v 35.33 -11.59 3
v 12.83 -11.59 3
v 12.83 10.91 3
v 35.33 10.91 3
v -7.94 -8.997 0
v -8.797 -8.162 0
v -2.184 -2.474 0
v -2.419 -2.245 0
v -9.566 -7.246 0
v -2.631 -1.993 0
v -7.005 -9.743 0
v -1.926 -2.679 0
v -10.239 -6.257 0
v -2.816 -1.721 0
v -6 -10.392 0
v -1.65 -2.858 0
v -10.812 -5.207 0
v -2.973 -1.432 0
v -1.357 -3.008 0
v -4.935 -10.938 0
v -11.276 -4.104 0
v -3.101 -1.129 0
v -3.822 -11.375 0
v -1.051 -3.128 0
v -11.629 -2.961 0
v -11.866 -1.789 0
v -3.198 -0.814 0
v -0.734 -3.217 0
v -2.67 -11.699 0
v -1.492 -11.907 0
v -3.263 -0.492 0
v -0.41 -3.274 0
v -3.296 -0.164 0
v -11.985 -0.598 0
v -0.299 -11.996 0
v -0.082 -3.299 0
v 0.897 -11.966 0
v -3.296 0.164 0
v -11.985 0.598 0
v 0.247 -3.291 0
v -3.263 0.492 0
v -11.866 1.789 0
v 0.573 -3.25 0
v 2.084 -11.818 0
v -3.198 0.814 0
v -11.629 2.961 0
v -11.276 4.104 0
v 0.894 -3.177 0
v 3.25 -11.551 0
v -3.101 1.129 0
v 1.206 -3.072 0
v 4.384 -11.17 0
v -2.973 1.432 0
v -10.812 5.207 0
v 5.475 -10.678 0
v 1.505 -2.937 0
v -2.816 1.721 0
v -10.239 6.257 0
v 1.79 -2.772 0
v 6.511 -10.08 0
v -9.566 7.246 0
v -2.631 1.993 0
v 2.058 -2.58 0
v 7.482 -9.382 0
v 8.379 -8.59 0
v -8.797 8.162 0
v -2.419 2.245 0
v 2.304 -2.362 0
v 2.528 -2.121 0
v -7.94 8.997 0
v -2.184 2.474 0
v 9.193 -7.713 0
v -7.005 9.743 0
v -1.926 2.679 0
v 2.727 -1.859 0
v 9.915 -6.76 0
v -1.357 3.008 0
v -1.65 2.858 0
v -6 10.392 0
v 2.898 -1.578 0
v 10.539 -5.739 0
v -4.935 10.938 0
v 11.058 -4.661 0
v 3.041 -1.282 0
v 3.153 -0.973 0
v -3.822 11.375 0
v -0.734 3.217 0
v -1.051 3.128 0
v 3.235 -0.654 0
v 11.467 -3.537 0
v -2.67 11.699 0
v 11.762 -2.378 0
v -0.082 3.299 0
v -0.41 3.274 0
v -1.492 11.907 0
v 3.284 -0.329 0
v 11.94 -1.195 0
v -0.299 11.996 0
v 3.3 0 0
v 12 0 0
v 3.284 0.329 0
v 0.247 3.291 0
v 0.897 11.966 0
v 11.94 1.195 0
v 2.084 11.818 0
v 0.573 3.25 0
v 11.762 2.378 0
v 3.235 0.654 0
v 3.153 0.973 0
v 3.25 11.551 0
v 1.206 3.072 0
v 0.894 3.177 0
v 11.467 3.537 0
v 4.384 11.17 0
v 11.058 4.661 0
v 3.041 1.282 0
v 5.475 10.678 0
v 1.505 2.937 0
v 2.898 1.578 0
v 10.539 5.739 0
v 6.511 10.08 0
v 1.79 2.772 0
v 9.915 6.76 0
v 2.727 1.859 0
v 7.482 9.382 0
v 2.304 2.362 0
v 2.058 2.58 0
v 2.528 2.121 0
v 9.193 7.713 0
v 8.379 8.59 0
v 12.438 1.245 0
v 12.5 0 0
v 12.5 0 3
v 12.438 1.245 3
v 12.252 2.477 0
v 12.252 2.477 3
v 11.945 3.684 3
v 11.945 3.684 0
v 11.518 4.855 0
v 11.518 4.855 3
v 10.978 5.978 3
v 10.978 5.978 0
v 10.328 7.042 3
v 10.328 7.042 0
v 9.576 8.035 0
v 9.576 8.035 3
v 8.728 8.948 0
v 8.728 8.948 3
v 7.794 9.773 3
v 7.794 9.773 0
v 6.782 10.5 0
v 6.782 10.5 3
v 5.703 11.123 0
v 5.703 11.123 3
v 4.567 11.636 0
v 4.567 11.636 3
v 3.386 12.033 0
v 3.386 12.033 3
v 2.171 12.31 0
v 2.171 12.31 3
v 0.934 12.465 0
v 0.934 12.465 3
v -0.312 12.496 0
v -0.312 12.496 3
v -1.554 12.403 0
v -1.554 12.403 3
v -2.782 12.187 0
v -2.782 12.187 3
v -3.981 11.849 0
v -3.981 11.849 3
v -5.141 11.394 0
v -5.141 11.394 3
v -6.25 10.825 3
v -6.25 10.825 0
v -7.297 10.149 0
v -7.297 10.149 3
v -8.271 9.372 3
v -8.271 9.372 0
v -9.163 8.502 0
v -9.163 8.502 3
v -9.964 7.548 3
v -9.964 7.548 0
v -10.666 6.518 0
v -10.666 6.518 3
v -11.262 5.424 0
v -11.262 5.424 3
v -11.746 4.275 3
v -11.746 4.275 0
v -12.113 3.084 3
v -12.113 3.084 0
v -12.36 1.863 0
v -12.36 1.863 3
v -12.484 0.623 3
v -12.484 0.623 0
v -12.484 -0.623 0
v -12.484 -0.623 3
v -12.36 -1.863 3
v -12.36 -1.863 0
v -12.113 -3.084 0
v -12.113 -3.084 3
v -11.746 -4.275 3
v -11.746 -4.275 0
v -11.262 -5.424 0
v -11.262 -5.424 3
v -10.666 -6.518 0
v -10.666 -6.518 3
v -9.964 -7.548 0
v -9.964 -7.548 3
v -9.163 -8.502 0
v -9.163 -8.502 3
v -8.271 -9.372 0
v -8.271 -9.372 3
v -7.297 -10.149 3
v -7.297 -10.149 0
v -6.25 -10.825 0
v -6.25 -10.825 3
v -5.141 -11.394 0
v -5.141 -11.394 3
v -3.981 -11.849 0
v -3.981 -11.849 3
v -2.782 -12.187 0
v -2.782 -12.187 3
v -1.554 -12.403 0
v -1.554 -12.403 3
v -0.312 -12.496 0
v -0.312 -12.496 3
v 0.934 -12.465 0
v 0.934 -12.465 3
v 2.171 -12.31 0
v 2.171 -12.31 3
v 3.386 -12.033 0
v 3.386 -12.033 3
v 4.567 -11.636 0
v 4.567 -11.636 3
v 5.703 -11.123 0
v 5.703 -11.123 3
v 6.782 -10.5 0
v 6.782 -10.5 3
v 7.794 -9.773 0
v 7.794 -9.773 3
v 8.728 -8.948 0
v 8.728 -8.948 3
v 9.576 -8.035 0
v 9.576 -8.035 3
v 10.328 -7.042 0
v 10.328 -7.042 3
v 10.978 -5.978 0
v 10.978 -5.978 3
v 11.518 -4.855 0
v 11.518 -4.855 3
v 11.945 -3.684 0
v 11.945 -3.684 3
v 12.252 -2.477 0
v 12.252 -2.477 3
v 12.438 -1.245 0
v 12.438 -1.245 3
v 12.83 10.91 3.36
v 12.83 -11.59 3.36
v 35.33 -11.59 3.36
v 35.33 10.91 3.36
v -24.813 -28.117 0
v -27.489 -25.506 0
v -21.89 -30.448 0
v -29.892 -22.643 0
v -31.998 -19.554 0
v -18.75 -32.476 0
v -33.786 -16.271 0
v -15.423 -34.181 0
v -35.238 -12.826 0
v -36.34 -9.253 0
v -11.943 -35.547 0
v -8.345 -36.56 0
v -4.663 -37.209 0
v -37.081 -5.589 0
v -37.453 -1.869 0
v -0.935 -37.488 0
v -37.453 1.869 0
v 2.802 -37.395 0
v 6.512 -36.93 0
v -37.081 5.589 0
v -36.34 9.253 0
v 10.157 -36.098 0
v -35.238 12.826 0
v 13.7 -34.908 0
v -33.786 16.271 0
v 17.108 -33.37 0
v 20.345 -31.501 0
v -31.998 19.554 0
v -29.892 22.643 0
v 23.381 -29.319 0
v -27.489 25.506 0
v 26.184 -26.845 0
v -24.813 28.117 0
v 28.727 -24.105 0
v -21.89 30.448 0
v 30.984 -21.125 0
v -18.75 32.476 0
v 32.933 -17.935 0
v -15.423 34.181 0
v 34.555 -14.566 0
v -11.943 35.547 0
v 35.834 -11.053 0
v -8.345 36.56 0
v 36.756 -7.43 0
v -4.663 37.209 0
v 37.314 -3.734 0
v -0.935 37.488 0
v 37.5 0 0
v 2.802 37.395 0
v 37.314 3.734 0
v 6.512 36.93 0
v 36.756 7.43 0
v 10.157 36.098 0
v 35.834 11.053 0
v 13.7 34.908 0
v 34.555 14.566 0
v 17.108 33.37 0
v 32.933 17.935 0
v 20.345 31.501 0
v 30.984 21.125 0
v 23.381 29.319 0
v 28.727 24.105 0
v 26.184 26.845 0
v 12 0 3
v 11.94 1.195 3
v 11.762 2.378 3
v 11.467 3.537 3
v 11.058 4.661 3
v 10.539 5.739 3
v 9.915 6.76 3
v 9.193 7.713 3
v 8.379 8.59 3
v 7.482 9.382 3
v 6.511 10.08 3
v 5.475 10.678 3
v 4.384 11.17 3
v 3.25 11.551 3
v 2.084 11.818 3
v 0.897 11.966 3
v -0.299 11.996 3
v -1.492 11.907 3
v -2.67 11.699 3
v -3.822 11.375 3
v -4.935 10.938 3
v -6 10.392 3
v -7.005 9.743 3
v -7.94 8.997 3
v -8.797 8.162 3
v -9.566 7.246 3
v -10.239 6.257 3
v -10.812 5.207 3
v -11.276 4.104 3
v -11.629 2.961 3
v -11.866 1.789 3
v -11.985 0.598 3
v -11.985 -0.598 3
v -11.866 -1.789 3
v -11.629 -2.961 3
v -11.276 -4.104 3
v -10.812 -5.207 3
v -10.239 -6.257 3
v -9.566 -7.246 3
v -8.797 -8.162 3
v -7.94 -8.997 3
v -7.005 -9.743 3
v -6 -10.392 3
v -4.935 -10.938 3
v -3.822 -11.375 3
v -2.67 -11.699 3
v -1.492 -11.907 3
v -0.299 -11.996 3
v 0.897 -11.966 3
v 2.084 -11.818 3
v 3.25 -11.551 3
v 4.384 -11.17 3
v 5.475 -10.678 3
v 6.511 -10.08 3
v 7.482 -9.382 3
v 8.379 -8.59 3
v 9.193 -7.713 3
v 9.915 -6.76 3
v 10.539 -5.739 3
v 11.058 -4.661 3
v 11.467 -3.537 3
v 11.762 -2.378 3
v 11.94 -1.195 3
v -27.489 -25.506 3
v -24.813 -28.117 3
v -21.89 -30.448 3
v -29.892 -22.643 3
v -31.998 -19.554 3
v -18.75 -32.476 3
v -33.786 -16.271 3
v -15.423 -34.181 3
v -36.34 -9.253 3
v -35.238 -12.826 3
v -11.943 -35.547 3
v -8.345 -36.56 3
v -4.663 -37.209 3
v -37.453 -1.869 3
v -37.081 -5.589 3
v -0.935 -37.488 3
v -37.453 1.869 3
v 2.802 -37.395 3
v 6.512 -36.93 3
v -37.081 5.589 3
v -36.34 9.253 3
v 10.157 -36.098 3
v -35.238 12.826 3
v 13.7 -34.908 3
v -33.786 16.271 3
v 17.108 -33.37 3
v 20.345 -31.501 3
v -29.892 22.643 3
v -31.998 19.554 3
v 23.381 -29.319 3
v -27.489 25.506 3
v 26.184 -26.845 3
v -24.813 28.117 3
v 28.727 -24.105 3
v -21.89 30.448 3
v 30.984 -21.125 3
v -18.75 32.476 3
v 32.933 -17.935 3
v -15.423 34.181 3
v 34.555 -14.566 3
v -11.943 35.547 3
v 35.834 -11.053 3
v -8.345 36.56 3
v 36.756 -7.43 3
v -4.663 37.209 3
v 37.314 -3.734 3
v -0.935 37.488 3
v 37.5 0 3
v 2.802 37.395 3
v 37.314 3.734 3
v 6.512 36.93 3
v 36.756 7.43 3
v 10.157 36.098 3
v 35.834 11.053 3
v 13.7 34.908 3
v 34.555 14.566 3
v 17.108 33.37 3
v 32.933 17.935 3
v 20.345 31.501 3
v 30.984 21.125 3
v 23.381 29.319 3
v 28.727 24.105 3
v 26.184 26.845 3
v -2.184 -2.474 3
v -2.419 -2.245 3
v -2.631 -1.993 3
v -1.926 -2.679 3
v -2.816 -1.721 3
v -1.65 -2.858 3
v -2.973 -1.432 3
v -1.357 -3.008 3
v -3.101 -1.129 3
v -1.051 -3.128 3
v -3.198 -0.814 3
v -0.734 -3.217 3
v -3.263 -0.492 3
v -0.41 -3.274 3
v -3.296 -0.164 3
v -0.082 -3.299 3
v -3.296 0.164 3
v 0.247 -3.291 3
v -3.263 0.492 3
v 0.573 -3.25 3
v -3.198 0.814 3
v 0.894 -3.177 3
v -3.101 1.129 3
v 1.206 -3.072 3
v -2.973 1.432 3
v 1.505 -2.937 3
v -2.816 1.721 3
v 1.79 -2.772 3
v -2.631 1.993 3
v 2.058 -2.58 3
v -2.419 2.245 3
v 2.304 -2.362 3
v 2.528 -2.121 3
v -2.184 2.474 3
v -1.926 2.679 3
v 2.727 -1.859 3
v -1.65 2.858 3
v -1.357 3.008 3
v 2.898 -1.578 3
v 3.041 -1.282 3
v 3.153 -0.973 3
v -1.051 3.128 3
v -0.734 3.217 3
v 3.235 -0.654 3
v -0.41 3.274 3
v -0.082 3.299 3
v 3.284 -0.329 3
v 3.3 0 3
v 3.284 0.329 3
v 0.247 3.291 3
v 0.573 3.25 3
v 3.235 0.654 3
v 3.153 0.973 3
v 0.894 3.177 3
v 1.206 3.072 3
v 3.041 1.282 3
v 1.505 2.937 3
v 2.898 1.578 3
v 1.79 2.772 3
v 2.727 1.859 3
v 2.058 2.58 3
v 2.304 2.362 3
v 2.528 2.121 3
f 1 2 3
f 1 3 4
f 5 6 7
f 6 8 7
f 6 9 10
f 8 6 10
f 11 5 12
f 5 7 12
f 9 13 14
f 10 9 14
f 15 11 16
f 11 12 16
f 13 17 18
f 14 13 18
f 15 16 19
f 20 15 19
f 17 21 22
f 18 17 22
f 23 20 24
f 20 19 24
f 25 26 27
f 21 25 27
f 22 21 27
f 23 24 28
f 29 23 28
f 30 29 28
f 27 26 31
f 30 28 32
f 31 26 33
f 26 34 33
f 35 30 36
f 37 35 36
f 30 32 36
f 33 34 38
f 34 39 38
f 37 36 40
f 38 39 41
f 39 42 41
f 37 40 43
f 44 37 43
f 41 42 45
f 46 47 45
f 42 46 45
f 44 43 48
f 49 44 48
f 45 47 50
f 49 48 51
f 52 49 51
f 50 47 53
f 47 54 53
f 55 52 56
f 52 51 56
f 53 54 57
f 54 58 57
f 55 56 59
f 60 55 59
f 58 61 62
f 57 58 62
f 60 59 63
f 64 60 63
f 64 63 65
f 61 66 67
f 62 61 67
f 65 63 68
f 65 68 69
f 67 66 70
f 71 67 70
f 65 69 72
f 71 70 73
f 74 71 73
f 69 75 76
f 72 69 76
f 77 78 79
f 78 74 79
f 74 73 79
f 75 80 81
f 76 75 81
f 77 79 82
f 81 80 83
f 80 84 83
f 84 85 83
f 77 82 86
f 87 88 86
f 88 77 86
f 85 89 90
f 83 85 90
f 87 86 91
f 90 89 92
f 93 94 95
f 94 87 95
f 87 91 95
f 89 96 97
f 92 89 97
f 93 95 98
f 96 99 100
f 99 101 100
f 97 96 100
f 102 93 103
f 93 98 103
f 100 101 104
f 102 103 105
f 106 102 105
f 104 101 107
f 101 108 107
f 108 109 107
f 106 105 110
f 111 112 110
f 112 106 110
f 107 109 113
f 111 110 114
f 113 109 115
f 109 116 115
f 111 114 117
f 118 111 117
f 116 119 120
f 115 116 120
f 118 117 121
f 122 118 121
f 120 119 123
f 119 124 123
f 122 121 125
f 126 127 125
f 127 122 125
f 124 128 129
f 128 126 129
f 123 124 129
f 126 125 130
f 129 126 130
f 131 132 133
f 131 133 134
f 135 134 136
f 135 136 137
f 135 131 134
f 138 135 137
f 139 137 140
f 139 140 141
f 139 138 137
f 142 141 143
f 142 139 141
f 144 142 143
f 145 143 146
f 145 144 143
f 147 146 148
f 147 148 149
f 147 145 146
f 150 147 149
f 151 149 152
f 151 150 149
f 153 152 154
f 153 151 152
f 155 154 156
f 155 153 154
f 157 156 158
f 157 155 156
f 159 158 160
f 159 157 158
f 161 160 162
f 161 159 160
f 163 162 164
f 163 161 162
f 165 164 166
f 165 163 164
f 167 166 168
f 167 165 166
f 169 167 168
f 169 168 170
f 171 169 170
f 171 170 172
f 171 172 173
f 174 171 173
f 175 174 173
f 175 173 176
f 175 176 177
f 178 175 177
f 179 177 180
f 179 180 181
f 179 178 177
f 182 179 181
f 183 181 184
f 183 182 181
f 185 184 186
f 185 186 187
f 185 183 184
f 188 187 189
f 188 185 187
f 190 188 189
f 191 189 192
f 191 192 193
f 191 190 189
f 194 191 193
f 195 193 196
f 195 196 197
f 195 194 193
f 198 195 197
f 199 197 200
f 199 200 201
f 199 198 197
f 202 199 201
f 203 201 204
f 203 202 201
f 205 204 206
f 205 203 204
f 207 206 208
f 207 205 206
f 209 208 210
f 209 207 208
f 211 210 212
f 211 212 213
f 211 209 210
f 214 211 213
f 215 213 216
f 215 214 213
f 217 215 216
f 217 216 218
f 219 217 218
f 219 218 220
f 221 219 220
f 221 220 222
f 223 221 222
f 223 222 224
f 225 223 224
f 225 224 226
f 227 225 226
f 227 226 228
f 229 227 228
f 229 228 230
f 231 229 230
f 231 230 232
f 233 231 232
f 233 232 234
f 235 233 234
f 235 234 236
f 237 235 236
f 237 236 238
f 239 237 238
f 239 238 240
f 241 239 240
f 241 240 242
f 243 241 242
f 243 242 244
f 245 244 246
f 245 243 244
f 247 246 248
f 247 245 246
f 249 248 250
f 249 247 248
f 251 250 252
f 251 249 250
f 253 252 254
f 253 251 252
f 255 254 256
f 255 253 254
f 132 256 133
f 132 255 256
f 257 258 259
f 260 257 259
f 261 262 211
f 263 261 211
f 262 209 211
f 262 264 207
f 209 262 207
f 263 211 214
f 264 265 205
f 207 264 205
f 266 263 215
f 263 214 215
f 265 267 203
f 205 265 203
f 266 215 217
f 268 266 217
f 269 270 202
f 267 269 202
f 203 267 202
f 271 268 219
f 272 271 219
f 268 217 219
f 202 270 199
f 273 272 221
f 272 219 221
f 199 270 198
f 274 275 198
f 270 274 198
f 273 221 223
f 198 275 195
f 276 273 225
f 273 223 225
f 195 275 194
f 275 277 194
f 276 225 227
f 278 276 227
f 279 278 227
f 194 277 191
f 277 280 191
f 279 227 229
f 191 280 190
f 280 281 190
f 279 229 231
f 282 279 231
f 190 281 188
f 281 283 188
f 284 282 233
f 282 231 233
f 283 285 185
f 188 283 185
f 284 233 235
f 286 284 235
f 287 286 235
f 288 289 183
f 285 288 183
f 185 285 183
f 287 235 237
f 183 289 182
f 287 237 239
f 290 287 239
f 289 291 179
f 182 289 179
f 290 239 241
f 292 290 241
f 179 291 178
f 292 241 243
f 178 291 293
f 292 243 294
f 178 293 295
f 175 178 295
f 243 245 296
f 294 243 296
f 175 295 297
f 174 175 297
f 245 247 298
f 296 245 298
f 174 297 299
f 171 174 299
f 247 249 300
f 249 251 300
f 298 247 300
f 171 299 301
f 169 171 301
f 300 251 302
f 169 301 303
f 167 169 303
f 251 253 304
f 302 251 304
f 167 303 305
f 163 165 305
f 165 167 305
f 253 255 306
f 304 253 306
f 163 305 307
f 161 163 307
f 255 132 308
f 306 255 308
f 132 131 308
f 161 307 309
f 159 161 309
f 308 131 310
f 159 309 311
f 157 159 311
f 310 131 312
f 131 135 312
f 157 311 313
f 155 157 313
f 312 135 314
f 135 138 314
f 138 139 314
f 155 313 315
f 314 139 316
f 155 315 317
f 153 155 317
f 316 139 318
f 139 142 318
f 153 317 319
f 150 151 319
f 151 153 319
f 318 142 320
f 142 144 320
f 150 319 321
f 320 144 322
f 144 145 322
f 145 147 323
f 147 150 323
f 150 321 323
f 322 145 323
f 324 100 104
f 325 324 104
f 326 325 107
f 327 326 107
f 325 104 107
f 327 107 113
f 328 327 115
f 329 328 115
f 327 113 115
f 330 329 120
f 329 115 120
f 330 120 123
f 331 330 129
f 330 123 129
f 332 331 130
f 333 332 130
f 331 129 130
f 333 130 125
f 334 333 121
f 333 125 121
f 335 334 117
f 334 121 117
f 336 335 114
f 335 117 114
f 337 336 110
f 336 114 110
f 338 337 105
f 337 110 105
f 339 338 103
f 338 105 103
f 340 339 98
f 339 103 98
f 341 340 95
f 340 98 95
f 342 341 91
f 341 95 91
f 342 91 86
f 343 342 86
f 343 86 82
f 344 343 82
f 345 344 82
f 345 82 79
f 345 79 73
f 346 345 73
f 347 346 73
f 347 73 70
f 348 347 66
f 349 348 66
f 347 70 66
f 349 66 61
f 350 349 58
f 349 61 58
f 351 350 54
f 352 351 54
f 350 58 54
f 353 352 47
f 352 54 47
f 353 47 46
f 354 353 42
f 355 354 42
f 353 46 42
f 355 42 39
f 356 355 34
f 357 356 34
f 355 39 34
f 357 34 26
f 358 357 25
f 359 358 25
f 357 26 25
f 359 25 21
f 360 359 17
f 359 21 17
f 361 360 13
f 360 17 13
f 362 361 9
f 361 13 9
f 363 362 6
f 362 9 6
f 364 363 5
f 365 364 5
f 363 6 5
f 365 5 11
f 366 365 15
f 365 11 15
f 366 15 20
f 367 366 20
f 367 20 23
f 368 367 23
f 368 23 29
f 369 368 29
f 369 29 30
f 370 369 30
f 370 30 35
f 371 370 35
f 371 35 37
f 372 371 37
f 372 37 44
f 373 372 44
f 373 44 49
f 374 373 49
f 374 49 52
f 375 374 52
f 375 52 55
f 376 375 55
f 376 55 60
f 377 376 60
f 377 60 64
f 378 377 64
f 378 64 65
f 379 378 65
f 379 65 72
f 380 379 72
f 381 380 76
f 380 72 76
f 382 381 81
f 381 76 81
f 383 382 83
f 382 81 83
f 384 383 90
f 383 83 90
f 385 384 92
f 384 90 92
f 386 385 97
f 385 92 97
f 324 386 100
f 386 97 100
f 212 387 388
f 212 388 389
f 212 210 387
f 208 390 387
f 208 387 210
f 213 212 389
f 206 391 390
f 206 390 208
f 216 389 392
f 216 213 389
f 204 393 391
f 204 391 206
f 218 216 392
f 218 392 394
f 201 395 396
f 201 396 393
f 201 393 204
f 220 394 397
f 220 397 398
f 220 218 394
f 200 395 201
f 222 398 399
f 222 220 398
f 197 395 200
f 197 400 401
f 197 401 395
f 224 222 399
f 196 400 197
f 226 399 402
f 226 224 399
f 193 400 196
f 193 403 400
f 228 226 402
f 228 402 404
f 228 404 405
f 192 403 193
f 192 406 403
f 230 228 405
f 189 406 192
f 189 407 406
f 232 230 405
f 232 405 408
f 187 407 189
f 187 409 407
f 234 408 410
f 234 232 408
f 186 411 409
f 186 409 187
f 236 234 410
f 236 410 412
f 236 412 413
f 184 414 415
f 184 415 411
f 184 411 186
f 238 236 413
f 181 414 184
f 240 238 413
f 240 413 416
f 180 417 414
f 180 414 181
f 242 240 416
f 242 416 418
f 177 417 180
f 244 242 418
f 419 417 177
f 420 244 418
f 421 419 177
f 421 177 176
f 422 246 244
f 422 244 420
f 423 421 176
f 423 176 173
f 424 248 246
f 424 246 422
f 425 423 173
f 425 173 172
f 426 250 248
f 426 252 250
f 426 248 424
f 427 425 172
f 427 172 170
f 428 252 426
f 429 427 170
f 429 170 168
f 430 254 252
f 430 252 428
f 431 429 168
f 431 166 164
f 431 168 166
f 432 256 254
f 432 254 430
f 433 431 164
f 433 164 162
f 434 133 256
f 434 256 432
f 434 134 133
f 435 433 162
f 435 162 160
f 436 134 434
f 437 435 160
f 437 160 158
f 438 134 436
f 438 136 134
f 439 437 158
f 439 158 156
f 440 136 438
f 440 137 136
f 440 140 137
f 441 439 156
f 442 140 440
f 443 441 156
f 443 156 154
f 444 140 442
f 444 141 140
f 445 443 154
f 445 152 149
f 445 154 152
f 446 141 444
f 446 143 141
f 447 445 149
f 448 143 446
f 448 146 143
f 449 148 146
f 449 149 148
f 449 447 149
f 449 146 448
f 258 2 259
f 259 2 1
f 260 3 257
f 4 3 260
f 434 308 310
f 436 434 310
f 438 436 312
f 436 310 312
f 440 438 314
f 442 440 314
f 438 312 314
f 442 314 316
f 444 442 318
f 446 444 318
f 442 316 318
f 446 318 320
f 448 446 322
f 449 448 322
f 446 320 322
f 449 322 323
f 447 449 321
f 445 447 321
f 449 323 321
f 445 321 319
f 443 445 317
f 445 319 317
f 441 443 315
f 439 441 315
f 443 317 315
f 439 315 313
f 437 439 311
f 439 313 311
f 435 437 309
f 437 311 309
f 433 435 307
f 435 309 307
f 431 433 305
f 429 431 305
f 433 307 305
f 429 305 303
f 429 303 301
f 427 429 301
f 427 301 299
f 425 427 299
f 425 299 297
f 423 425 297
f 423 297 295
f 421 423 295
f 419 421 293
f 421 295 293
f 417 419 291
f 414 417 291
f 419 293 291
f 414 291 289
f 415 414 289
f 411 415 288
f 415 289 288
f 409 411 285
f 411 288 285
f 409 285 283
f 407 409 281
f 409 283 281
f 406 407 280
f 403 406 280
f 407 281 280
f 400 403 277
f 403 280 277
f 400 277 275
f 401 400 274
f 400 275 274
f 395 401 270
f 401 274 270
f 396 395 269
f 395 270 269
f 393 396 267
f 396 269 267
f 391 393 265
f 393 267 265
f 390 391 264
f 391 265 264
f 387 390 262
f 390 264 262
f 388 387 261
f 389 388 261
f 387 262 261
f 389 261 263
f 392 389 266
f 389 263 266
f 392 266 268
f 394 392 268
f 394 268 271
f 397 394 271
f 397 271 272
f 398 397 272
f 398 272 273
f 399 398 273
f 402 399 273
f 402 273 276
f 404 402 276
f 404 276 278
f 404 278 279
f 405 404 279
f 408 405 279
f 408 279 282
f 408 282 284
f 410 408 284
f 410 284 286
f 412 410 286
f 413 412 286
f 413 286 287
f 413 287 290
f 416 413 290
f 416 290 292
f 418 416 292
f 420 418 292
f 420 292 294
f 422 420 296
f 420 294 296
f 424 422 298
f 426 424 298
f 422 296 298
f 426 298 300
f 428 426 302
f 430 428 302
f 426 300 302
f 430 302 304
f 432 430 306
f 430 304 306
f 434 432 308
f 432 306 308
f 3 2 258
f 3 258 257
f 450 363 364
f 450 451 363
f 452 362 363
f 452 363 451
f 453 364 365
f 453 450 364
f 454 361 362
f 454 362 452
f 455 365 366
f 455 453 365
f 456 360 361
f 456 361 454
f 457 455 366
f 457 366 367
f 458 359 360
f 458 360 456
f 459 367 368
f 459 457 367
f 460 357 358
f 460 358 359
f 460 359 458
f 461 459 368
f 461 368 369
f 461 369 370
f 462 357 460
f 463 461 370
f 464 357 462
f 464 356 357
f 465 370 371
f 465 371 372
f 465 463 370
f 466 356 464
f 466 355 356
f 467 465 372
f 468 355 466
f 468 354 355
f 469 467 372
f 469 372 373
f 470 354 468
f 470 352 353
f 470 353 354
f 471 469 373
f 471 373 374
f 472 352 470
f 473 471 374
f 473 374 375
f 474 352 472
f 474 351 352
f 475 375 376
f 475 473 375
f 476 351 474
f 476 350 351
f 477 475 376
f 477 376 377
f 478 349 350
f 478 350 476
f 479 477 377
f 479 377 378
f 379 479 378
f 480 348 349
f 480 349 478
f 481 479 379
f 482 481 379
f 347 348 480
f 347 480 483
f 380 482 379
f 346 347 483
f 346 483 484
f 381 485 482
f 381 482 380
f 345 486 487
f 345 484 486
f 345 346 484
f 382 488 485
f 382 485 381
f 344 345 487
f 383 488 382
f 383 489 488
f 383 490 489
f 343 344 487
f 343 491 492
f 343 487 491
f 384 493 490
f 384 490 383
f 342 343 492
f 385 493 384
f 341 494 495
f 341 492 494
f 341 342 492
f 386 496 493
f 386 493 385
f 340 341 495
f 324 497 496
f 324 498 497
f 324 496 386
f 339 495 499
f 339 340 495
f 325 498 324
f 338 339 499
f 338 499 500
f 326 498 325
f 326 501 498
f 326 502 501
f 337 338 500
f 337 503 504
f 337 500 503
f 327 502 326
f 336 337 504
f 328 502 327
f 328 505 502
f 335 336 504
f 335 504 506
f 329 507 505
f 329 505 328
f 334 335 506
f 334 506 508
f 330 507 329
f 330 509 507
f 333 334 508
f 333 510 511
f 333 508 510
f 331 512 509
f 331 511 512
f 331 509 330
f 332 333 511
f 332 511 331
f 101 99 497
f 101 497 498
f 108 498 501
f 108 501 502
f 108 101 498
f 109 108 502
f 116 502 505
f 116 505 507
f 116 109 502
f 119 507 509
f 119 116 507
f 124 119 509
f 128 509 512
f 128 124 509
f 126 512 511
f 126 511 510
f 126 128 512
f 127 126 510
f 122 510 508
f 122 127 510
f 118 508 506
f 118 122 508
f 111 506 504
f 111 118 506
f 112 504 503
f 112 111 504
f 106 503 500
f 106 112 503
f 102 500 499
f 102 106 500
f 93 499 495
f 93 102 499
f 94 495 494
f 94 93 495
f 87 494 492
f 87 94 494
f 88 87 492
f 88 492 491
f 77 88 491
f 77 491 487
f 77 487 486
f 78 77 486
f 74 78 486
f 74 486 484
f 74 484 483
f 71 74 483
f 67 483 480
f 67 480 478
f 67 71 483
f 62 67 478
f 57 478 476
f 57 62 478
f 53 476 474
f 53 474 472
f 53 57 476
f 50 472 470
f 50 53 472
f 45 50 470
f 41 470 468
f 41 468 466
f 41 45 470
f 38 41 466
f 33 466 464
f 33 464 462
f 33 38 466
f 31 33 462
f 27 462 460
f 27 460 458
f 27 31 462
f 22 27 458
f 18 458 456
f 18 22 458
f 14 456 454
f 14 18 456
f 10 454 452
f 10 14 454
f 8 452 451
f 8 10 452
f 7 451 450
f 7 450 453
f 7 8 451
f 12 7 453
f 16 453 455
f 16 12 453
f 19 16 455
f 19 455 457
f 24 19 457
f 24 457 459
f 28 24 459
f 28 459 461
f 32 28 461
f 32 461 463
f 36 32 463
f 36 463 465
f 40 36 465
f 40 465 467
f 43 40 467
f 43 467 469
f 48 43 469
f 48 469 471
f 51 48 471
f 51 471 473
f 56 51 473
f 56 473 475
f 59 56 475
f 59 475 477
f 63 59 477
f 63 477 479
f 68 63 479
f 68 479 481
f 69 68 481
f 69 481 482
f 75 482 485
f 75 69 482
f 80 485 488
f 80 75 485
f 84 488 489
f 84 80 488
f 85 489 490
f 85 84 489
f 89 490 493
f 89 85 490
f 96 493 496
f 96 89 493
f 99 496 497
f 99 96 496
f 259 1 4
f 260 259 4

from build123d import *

# Parameters (mm, degrees)
F0_R     = 37.5
F0_R_2   = 12.5
F1_DEPTH = 3
F2_R     = 12
F2_R_2   = 3.3
F3_DEPTH = 3
F4_W     = 22.5
F4_H     = 22.5
F5_DEPTH = 0.36


with BuildPart() as f1:
    # F0 (on Top) → F1 (new body)
    with BuildSketch(Plane.XY):
        Circle(F0_R)
        Circle(F0_R_2, mode=Mode.SUBTRACT)
    extrude(amount=F1_DEPTH)


with BuildPart() as f3:
    # F2 (on Top) → F3 (new body)
    with BuildSketch(Plane.XY):
        Circle(F2_R)
        Circle(F2_R_2, mode=Mode.SUBTRACT)
    extrude(amount=F3_DEPTH)


with BuildPart() as f5:
    # F4 (on face) → F5 (new body)
    with BuildSketch(Plane.XY.offset(3)):
        with Locations((24.079939, -0.339978)):
            Rectangle(F4_W, F4_H)
    extrude(amount=F5_DEPTH)


solid = Compound([f1.part, f3.part, f5.part])
